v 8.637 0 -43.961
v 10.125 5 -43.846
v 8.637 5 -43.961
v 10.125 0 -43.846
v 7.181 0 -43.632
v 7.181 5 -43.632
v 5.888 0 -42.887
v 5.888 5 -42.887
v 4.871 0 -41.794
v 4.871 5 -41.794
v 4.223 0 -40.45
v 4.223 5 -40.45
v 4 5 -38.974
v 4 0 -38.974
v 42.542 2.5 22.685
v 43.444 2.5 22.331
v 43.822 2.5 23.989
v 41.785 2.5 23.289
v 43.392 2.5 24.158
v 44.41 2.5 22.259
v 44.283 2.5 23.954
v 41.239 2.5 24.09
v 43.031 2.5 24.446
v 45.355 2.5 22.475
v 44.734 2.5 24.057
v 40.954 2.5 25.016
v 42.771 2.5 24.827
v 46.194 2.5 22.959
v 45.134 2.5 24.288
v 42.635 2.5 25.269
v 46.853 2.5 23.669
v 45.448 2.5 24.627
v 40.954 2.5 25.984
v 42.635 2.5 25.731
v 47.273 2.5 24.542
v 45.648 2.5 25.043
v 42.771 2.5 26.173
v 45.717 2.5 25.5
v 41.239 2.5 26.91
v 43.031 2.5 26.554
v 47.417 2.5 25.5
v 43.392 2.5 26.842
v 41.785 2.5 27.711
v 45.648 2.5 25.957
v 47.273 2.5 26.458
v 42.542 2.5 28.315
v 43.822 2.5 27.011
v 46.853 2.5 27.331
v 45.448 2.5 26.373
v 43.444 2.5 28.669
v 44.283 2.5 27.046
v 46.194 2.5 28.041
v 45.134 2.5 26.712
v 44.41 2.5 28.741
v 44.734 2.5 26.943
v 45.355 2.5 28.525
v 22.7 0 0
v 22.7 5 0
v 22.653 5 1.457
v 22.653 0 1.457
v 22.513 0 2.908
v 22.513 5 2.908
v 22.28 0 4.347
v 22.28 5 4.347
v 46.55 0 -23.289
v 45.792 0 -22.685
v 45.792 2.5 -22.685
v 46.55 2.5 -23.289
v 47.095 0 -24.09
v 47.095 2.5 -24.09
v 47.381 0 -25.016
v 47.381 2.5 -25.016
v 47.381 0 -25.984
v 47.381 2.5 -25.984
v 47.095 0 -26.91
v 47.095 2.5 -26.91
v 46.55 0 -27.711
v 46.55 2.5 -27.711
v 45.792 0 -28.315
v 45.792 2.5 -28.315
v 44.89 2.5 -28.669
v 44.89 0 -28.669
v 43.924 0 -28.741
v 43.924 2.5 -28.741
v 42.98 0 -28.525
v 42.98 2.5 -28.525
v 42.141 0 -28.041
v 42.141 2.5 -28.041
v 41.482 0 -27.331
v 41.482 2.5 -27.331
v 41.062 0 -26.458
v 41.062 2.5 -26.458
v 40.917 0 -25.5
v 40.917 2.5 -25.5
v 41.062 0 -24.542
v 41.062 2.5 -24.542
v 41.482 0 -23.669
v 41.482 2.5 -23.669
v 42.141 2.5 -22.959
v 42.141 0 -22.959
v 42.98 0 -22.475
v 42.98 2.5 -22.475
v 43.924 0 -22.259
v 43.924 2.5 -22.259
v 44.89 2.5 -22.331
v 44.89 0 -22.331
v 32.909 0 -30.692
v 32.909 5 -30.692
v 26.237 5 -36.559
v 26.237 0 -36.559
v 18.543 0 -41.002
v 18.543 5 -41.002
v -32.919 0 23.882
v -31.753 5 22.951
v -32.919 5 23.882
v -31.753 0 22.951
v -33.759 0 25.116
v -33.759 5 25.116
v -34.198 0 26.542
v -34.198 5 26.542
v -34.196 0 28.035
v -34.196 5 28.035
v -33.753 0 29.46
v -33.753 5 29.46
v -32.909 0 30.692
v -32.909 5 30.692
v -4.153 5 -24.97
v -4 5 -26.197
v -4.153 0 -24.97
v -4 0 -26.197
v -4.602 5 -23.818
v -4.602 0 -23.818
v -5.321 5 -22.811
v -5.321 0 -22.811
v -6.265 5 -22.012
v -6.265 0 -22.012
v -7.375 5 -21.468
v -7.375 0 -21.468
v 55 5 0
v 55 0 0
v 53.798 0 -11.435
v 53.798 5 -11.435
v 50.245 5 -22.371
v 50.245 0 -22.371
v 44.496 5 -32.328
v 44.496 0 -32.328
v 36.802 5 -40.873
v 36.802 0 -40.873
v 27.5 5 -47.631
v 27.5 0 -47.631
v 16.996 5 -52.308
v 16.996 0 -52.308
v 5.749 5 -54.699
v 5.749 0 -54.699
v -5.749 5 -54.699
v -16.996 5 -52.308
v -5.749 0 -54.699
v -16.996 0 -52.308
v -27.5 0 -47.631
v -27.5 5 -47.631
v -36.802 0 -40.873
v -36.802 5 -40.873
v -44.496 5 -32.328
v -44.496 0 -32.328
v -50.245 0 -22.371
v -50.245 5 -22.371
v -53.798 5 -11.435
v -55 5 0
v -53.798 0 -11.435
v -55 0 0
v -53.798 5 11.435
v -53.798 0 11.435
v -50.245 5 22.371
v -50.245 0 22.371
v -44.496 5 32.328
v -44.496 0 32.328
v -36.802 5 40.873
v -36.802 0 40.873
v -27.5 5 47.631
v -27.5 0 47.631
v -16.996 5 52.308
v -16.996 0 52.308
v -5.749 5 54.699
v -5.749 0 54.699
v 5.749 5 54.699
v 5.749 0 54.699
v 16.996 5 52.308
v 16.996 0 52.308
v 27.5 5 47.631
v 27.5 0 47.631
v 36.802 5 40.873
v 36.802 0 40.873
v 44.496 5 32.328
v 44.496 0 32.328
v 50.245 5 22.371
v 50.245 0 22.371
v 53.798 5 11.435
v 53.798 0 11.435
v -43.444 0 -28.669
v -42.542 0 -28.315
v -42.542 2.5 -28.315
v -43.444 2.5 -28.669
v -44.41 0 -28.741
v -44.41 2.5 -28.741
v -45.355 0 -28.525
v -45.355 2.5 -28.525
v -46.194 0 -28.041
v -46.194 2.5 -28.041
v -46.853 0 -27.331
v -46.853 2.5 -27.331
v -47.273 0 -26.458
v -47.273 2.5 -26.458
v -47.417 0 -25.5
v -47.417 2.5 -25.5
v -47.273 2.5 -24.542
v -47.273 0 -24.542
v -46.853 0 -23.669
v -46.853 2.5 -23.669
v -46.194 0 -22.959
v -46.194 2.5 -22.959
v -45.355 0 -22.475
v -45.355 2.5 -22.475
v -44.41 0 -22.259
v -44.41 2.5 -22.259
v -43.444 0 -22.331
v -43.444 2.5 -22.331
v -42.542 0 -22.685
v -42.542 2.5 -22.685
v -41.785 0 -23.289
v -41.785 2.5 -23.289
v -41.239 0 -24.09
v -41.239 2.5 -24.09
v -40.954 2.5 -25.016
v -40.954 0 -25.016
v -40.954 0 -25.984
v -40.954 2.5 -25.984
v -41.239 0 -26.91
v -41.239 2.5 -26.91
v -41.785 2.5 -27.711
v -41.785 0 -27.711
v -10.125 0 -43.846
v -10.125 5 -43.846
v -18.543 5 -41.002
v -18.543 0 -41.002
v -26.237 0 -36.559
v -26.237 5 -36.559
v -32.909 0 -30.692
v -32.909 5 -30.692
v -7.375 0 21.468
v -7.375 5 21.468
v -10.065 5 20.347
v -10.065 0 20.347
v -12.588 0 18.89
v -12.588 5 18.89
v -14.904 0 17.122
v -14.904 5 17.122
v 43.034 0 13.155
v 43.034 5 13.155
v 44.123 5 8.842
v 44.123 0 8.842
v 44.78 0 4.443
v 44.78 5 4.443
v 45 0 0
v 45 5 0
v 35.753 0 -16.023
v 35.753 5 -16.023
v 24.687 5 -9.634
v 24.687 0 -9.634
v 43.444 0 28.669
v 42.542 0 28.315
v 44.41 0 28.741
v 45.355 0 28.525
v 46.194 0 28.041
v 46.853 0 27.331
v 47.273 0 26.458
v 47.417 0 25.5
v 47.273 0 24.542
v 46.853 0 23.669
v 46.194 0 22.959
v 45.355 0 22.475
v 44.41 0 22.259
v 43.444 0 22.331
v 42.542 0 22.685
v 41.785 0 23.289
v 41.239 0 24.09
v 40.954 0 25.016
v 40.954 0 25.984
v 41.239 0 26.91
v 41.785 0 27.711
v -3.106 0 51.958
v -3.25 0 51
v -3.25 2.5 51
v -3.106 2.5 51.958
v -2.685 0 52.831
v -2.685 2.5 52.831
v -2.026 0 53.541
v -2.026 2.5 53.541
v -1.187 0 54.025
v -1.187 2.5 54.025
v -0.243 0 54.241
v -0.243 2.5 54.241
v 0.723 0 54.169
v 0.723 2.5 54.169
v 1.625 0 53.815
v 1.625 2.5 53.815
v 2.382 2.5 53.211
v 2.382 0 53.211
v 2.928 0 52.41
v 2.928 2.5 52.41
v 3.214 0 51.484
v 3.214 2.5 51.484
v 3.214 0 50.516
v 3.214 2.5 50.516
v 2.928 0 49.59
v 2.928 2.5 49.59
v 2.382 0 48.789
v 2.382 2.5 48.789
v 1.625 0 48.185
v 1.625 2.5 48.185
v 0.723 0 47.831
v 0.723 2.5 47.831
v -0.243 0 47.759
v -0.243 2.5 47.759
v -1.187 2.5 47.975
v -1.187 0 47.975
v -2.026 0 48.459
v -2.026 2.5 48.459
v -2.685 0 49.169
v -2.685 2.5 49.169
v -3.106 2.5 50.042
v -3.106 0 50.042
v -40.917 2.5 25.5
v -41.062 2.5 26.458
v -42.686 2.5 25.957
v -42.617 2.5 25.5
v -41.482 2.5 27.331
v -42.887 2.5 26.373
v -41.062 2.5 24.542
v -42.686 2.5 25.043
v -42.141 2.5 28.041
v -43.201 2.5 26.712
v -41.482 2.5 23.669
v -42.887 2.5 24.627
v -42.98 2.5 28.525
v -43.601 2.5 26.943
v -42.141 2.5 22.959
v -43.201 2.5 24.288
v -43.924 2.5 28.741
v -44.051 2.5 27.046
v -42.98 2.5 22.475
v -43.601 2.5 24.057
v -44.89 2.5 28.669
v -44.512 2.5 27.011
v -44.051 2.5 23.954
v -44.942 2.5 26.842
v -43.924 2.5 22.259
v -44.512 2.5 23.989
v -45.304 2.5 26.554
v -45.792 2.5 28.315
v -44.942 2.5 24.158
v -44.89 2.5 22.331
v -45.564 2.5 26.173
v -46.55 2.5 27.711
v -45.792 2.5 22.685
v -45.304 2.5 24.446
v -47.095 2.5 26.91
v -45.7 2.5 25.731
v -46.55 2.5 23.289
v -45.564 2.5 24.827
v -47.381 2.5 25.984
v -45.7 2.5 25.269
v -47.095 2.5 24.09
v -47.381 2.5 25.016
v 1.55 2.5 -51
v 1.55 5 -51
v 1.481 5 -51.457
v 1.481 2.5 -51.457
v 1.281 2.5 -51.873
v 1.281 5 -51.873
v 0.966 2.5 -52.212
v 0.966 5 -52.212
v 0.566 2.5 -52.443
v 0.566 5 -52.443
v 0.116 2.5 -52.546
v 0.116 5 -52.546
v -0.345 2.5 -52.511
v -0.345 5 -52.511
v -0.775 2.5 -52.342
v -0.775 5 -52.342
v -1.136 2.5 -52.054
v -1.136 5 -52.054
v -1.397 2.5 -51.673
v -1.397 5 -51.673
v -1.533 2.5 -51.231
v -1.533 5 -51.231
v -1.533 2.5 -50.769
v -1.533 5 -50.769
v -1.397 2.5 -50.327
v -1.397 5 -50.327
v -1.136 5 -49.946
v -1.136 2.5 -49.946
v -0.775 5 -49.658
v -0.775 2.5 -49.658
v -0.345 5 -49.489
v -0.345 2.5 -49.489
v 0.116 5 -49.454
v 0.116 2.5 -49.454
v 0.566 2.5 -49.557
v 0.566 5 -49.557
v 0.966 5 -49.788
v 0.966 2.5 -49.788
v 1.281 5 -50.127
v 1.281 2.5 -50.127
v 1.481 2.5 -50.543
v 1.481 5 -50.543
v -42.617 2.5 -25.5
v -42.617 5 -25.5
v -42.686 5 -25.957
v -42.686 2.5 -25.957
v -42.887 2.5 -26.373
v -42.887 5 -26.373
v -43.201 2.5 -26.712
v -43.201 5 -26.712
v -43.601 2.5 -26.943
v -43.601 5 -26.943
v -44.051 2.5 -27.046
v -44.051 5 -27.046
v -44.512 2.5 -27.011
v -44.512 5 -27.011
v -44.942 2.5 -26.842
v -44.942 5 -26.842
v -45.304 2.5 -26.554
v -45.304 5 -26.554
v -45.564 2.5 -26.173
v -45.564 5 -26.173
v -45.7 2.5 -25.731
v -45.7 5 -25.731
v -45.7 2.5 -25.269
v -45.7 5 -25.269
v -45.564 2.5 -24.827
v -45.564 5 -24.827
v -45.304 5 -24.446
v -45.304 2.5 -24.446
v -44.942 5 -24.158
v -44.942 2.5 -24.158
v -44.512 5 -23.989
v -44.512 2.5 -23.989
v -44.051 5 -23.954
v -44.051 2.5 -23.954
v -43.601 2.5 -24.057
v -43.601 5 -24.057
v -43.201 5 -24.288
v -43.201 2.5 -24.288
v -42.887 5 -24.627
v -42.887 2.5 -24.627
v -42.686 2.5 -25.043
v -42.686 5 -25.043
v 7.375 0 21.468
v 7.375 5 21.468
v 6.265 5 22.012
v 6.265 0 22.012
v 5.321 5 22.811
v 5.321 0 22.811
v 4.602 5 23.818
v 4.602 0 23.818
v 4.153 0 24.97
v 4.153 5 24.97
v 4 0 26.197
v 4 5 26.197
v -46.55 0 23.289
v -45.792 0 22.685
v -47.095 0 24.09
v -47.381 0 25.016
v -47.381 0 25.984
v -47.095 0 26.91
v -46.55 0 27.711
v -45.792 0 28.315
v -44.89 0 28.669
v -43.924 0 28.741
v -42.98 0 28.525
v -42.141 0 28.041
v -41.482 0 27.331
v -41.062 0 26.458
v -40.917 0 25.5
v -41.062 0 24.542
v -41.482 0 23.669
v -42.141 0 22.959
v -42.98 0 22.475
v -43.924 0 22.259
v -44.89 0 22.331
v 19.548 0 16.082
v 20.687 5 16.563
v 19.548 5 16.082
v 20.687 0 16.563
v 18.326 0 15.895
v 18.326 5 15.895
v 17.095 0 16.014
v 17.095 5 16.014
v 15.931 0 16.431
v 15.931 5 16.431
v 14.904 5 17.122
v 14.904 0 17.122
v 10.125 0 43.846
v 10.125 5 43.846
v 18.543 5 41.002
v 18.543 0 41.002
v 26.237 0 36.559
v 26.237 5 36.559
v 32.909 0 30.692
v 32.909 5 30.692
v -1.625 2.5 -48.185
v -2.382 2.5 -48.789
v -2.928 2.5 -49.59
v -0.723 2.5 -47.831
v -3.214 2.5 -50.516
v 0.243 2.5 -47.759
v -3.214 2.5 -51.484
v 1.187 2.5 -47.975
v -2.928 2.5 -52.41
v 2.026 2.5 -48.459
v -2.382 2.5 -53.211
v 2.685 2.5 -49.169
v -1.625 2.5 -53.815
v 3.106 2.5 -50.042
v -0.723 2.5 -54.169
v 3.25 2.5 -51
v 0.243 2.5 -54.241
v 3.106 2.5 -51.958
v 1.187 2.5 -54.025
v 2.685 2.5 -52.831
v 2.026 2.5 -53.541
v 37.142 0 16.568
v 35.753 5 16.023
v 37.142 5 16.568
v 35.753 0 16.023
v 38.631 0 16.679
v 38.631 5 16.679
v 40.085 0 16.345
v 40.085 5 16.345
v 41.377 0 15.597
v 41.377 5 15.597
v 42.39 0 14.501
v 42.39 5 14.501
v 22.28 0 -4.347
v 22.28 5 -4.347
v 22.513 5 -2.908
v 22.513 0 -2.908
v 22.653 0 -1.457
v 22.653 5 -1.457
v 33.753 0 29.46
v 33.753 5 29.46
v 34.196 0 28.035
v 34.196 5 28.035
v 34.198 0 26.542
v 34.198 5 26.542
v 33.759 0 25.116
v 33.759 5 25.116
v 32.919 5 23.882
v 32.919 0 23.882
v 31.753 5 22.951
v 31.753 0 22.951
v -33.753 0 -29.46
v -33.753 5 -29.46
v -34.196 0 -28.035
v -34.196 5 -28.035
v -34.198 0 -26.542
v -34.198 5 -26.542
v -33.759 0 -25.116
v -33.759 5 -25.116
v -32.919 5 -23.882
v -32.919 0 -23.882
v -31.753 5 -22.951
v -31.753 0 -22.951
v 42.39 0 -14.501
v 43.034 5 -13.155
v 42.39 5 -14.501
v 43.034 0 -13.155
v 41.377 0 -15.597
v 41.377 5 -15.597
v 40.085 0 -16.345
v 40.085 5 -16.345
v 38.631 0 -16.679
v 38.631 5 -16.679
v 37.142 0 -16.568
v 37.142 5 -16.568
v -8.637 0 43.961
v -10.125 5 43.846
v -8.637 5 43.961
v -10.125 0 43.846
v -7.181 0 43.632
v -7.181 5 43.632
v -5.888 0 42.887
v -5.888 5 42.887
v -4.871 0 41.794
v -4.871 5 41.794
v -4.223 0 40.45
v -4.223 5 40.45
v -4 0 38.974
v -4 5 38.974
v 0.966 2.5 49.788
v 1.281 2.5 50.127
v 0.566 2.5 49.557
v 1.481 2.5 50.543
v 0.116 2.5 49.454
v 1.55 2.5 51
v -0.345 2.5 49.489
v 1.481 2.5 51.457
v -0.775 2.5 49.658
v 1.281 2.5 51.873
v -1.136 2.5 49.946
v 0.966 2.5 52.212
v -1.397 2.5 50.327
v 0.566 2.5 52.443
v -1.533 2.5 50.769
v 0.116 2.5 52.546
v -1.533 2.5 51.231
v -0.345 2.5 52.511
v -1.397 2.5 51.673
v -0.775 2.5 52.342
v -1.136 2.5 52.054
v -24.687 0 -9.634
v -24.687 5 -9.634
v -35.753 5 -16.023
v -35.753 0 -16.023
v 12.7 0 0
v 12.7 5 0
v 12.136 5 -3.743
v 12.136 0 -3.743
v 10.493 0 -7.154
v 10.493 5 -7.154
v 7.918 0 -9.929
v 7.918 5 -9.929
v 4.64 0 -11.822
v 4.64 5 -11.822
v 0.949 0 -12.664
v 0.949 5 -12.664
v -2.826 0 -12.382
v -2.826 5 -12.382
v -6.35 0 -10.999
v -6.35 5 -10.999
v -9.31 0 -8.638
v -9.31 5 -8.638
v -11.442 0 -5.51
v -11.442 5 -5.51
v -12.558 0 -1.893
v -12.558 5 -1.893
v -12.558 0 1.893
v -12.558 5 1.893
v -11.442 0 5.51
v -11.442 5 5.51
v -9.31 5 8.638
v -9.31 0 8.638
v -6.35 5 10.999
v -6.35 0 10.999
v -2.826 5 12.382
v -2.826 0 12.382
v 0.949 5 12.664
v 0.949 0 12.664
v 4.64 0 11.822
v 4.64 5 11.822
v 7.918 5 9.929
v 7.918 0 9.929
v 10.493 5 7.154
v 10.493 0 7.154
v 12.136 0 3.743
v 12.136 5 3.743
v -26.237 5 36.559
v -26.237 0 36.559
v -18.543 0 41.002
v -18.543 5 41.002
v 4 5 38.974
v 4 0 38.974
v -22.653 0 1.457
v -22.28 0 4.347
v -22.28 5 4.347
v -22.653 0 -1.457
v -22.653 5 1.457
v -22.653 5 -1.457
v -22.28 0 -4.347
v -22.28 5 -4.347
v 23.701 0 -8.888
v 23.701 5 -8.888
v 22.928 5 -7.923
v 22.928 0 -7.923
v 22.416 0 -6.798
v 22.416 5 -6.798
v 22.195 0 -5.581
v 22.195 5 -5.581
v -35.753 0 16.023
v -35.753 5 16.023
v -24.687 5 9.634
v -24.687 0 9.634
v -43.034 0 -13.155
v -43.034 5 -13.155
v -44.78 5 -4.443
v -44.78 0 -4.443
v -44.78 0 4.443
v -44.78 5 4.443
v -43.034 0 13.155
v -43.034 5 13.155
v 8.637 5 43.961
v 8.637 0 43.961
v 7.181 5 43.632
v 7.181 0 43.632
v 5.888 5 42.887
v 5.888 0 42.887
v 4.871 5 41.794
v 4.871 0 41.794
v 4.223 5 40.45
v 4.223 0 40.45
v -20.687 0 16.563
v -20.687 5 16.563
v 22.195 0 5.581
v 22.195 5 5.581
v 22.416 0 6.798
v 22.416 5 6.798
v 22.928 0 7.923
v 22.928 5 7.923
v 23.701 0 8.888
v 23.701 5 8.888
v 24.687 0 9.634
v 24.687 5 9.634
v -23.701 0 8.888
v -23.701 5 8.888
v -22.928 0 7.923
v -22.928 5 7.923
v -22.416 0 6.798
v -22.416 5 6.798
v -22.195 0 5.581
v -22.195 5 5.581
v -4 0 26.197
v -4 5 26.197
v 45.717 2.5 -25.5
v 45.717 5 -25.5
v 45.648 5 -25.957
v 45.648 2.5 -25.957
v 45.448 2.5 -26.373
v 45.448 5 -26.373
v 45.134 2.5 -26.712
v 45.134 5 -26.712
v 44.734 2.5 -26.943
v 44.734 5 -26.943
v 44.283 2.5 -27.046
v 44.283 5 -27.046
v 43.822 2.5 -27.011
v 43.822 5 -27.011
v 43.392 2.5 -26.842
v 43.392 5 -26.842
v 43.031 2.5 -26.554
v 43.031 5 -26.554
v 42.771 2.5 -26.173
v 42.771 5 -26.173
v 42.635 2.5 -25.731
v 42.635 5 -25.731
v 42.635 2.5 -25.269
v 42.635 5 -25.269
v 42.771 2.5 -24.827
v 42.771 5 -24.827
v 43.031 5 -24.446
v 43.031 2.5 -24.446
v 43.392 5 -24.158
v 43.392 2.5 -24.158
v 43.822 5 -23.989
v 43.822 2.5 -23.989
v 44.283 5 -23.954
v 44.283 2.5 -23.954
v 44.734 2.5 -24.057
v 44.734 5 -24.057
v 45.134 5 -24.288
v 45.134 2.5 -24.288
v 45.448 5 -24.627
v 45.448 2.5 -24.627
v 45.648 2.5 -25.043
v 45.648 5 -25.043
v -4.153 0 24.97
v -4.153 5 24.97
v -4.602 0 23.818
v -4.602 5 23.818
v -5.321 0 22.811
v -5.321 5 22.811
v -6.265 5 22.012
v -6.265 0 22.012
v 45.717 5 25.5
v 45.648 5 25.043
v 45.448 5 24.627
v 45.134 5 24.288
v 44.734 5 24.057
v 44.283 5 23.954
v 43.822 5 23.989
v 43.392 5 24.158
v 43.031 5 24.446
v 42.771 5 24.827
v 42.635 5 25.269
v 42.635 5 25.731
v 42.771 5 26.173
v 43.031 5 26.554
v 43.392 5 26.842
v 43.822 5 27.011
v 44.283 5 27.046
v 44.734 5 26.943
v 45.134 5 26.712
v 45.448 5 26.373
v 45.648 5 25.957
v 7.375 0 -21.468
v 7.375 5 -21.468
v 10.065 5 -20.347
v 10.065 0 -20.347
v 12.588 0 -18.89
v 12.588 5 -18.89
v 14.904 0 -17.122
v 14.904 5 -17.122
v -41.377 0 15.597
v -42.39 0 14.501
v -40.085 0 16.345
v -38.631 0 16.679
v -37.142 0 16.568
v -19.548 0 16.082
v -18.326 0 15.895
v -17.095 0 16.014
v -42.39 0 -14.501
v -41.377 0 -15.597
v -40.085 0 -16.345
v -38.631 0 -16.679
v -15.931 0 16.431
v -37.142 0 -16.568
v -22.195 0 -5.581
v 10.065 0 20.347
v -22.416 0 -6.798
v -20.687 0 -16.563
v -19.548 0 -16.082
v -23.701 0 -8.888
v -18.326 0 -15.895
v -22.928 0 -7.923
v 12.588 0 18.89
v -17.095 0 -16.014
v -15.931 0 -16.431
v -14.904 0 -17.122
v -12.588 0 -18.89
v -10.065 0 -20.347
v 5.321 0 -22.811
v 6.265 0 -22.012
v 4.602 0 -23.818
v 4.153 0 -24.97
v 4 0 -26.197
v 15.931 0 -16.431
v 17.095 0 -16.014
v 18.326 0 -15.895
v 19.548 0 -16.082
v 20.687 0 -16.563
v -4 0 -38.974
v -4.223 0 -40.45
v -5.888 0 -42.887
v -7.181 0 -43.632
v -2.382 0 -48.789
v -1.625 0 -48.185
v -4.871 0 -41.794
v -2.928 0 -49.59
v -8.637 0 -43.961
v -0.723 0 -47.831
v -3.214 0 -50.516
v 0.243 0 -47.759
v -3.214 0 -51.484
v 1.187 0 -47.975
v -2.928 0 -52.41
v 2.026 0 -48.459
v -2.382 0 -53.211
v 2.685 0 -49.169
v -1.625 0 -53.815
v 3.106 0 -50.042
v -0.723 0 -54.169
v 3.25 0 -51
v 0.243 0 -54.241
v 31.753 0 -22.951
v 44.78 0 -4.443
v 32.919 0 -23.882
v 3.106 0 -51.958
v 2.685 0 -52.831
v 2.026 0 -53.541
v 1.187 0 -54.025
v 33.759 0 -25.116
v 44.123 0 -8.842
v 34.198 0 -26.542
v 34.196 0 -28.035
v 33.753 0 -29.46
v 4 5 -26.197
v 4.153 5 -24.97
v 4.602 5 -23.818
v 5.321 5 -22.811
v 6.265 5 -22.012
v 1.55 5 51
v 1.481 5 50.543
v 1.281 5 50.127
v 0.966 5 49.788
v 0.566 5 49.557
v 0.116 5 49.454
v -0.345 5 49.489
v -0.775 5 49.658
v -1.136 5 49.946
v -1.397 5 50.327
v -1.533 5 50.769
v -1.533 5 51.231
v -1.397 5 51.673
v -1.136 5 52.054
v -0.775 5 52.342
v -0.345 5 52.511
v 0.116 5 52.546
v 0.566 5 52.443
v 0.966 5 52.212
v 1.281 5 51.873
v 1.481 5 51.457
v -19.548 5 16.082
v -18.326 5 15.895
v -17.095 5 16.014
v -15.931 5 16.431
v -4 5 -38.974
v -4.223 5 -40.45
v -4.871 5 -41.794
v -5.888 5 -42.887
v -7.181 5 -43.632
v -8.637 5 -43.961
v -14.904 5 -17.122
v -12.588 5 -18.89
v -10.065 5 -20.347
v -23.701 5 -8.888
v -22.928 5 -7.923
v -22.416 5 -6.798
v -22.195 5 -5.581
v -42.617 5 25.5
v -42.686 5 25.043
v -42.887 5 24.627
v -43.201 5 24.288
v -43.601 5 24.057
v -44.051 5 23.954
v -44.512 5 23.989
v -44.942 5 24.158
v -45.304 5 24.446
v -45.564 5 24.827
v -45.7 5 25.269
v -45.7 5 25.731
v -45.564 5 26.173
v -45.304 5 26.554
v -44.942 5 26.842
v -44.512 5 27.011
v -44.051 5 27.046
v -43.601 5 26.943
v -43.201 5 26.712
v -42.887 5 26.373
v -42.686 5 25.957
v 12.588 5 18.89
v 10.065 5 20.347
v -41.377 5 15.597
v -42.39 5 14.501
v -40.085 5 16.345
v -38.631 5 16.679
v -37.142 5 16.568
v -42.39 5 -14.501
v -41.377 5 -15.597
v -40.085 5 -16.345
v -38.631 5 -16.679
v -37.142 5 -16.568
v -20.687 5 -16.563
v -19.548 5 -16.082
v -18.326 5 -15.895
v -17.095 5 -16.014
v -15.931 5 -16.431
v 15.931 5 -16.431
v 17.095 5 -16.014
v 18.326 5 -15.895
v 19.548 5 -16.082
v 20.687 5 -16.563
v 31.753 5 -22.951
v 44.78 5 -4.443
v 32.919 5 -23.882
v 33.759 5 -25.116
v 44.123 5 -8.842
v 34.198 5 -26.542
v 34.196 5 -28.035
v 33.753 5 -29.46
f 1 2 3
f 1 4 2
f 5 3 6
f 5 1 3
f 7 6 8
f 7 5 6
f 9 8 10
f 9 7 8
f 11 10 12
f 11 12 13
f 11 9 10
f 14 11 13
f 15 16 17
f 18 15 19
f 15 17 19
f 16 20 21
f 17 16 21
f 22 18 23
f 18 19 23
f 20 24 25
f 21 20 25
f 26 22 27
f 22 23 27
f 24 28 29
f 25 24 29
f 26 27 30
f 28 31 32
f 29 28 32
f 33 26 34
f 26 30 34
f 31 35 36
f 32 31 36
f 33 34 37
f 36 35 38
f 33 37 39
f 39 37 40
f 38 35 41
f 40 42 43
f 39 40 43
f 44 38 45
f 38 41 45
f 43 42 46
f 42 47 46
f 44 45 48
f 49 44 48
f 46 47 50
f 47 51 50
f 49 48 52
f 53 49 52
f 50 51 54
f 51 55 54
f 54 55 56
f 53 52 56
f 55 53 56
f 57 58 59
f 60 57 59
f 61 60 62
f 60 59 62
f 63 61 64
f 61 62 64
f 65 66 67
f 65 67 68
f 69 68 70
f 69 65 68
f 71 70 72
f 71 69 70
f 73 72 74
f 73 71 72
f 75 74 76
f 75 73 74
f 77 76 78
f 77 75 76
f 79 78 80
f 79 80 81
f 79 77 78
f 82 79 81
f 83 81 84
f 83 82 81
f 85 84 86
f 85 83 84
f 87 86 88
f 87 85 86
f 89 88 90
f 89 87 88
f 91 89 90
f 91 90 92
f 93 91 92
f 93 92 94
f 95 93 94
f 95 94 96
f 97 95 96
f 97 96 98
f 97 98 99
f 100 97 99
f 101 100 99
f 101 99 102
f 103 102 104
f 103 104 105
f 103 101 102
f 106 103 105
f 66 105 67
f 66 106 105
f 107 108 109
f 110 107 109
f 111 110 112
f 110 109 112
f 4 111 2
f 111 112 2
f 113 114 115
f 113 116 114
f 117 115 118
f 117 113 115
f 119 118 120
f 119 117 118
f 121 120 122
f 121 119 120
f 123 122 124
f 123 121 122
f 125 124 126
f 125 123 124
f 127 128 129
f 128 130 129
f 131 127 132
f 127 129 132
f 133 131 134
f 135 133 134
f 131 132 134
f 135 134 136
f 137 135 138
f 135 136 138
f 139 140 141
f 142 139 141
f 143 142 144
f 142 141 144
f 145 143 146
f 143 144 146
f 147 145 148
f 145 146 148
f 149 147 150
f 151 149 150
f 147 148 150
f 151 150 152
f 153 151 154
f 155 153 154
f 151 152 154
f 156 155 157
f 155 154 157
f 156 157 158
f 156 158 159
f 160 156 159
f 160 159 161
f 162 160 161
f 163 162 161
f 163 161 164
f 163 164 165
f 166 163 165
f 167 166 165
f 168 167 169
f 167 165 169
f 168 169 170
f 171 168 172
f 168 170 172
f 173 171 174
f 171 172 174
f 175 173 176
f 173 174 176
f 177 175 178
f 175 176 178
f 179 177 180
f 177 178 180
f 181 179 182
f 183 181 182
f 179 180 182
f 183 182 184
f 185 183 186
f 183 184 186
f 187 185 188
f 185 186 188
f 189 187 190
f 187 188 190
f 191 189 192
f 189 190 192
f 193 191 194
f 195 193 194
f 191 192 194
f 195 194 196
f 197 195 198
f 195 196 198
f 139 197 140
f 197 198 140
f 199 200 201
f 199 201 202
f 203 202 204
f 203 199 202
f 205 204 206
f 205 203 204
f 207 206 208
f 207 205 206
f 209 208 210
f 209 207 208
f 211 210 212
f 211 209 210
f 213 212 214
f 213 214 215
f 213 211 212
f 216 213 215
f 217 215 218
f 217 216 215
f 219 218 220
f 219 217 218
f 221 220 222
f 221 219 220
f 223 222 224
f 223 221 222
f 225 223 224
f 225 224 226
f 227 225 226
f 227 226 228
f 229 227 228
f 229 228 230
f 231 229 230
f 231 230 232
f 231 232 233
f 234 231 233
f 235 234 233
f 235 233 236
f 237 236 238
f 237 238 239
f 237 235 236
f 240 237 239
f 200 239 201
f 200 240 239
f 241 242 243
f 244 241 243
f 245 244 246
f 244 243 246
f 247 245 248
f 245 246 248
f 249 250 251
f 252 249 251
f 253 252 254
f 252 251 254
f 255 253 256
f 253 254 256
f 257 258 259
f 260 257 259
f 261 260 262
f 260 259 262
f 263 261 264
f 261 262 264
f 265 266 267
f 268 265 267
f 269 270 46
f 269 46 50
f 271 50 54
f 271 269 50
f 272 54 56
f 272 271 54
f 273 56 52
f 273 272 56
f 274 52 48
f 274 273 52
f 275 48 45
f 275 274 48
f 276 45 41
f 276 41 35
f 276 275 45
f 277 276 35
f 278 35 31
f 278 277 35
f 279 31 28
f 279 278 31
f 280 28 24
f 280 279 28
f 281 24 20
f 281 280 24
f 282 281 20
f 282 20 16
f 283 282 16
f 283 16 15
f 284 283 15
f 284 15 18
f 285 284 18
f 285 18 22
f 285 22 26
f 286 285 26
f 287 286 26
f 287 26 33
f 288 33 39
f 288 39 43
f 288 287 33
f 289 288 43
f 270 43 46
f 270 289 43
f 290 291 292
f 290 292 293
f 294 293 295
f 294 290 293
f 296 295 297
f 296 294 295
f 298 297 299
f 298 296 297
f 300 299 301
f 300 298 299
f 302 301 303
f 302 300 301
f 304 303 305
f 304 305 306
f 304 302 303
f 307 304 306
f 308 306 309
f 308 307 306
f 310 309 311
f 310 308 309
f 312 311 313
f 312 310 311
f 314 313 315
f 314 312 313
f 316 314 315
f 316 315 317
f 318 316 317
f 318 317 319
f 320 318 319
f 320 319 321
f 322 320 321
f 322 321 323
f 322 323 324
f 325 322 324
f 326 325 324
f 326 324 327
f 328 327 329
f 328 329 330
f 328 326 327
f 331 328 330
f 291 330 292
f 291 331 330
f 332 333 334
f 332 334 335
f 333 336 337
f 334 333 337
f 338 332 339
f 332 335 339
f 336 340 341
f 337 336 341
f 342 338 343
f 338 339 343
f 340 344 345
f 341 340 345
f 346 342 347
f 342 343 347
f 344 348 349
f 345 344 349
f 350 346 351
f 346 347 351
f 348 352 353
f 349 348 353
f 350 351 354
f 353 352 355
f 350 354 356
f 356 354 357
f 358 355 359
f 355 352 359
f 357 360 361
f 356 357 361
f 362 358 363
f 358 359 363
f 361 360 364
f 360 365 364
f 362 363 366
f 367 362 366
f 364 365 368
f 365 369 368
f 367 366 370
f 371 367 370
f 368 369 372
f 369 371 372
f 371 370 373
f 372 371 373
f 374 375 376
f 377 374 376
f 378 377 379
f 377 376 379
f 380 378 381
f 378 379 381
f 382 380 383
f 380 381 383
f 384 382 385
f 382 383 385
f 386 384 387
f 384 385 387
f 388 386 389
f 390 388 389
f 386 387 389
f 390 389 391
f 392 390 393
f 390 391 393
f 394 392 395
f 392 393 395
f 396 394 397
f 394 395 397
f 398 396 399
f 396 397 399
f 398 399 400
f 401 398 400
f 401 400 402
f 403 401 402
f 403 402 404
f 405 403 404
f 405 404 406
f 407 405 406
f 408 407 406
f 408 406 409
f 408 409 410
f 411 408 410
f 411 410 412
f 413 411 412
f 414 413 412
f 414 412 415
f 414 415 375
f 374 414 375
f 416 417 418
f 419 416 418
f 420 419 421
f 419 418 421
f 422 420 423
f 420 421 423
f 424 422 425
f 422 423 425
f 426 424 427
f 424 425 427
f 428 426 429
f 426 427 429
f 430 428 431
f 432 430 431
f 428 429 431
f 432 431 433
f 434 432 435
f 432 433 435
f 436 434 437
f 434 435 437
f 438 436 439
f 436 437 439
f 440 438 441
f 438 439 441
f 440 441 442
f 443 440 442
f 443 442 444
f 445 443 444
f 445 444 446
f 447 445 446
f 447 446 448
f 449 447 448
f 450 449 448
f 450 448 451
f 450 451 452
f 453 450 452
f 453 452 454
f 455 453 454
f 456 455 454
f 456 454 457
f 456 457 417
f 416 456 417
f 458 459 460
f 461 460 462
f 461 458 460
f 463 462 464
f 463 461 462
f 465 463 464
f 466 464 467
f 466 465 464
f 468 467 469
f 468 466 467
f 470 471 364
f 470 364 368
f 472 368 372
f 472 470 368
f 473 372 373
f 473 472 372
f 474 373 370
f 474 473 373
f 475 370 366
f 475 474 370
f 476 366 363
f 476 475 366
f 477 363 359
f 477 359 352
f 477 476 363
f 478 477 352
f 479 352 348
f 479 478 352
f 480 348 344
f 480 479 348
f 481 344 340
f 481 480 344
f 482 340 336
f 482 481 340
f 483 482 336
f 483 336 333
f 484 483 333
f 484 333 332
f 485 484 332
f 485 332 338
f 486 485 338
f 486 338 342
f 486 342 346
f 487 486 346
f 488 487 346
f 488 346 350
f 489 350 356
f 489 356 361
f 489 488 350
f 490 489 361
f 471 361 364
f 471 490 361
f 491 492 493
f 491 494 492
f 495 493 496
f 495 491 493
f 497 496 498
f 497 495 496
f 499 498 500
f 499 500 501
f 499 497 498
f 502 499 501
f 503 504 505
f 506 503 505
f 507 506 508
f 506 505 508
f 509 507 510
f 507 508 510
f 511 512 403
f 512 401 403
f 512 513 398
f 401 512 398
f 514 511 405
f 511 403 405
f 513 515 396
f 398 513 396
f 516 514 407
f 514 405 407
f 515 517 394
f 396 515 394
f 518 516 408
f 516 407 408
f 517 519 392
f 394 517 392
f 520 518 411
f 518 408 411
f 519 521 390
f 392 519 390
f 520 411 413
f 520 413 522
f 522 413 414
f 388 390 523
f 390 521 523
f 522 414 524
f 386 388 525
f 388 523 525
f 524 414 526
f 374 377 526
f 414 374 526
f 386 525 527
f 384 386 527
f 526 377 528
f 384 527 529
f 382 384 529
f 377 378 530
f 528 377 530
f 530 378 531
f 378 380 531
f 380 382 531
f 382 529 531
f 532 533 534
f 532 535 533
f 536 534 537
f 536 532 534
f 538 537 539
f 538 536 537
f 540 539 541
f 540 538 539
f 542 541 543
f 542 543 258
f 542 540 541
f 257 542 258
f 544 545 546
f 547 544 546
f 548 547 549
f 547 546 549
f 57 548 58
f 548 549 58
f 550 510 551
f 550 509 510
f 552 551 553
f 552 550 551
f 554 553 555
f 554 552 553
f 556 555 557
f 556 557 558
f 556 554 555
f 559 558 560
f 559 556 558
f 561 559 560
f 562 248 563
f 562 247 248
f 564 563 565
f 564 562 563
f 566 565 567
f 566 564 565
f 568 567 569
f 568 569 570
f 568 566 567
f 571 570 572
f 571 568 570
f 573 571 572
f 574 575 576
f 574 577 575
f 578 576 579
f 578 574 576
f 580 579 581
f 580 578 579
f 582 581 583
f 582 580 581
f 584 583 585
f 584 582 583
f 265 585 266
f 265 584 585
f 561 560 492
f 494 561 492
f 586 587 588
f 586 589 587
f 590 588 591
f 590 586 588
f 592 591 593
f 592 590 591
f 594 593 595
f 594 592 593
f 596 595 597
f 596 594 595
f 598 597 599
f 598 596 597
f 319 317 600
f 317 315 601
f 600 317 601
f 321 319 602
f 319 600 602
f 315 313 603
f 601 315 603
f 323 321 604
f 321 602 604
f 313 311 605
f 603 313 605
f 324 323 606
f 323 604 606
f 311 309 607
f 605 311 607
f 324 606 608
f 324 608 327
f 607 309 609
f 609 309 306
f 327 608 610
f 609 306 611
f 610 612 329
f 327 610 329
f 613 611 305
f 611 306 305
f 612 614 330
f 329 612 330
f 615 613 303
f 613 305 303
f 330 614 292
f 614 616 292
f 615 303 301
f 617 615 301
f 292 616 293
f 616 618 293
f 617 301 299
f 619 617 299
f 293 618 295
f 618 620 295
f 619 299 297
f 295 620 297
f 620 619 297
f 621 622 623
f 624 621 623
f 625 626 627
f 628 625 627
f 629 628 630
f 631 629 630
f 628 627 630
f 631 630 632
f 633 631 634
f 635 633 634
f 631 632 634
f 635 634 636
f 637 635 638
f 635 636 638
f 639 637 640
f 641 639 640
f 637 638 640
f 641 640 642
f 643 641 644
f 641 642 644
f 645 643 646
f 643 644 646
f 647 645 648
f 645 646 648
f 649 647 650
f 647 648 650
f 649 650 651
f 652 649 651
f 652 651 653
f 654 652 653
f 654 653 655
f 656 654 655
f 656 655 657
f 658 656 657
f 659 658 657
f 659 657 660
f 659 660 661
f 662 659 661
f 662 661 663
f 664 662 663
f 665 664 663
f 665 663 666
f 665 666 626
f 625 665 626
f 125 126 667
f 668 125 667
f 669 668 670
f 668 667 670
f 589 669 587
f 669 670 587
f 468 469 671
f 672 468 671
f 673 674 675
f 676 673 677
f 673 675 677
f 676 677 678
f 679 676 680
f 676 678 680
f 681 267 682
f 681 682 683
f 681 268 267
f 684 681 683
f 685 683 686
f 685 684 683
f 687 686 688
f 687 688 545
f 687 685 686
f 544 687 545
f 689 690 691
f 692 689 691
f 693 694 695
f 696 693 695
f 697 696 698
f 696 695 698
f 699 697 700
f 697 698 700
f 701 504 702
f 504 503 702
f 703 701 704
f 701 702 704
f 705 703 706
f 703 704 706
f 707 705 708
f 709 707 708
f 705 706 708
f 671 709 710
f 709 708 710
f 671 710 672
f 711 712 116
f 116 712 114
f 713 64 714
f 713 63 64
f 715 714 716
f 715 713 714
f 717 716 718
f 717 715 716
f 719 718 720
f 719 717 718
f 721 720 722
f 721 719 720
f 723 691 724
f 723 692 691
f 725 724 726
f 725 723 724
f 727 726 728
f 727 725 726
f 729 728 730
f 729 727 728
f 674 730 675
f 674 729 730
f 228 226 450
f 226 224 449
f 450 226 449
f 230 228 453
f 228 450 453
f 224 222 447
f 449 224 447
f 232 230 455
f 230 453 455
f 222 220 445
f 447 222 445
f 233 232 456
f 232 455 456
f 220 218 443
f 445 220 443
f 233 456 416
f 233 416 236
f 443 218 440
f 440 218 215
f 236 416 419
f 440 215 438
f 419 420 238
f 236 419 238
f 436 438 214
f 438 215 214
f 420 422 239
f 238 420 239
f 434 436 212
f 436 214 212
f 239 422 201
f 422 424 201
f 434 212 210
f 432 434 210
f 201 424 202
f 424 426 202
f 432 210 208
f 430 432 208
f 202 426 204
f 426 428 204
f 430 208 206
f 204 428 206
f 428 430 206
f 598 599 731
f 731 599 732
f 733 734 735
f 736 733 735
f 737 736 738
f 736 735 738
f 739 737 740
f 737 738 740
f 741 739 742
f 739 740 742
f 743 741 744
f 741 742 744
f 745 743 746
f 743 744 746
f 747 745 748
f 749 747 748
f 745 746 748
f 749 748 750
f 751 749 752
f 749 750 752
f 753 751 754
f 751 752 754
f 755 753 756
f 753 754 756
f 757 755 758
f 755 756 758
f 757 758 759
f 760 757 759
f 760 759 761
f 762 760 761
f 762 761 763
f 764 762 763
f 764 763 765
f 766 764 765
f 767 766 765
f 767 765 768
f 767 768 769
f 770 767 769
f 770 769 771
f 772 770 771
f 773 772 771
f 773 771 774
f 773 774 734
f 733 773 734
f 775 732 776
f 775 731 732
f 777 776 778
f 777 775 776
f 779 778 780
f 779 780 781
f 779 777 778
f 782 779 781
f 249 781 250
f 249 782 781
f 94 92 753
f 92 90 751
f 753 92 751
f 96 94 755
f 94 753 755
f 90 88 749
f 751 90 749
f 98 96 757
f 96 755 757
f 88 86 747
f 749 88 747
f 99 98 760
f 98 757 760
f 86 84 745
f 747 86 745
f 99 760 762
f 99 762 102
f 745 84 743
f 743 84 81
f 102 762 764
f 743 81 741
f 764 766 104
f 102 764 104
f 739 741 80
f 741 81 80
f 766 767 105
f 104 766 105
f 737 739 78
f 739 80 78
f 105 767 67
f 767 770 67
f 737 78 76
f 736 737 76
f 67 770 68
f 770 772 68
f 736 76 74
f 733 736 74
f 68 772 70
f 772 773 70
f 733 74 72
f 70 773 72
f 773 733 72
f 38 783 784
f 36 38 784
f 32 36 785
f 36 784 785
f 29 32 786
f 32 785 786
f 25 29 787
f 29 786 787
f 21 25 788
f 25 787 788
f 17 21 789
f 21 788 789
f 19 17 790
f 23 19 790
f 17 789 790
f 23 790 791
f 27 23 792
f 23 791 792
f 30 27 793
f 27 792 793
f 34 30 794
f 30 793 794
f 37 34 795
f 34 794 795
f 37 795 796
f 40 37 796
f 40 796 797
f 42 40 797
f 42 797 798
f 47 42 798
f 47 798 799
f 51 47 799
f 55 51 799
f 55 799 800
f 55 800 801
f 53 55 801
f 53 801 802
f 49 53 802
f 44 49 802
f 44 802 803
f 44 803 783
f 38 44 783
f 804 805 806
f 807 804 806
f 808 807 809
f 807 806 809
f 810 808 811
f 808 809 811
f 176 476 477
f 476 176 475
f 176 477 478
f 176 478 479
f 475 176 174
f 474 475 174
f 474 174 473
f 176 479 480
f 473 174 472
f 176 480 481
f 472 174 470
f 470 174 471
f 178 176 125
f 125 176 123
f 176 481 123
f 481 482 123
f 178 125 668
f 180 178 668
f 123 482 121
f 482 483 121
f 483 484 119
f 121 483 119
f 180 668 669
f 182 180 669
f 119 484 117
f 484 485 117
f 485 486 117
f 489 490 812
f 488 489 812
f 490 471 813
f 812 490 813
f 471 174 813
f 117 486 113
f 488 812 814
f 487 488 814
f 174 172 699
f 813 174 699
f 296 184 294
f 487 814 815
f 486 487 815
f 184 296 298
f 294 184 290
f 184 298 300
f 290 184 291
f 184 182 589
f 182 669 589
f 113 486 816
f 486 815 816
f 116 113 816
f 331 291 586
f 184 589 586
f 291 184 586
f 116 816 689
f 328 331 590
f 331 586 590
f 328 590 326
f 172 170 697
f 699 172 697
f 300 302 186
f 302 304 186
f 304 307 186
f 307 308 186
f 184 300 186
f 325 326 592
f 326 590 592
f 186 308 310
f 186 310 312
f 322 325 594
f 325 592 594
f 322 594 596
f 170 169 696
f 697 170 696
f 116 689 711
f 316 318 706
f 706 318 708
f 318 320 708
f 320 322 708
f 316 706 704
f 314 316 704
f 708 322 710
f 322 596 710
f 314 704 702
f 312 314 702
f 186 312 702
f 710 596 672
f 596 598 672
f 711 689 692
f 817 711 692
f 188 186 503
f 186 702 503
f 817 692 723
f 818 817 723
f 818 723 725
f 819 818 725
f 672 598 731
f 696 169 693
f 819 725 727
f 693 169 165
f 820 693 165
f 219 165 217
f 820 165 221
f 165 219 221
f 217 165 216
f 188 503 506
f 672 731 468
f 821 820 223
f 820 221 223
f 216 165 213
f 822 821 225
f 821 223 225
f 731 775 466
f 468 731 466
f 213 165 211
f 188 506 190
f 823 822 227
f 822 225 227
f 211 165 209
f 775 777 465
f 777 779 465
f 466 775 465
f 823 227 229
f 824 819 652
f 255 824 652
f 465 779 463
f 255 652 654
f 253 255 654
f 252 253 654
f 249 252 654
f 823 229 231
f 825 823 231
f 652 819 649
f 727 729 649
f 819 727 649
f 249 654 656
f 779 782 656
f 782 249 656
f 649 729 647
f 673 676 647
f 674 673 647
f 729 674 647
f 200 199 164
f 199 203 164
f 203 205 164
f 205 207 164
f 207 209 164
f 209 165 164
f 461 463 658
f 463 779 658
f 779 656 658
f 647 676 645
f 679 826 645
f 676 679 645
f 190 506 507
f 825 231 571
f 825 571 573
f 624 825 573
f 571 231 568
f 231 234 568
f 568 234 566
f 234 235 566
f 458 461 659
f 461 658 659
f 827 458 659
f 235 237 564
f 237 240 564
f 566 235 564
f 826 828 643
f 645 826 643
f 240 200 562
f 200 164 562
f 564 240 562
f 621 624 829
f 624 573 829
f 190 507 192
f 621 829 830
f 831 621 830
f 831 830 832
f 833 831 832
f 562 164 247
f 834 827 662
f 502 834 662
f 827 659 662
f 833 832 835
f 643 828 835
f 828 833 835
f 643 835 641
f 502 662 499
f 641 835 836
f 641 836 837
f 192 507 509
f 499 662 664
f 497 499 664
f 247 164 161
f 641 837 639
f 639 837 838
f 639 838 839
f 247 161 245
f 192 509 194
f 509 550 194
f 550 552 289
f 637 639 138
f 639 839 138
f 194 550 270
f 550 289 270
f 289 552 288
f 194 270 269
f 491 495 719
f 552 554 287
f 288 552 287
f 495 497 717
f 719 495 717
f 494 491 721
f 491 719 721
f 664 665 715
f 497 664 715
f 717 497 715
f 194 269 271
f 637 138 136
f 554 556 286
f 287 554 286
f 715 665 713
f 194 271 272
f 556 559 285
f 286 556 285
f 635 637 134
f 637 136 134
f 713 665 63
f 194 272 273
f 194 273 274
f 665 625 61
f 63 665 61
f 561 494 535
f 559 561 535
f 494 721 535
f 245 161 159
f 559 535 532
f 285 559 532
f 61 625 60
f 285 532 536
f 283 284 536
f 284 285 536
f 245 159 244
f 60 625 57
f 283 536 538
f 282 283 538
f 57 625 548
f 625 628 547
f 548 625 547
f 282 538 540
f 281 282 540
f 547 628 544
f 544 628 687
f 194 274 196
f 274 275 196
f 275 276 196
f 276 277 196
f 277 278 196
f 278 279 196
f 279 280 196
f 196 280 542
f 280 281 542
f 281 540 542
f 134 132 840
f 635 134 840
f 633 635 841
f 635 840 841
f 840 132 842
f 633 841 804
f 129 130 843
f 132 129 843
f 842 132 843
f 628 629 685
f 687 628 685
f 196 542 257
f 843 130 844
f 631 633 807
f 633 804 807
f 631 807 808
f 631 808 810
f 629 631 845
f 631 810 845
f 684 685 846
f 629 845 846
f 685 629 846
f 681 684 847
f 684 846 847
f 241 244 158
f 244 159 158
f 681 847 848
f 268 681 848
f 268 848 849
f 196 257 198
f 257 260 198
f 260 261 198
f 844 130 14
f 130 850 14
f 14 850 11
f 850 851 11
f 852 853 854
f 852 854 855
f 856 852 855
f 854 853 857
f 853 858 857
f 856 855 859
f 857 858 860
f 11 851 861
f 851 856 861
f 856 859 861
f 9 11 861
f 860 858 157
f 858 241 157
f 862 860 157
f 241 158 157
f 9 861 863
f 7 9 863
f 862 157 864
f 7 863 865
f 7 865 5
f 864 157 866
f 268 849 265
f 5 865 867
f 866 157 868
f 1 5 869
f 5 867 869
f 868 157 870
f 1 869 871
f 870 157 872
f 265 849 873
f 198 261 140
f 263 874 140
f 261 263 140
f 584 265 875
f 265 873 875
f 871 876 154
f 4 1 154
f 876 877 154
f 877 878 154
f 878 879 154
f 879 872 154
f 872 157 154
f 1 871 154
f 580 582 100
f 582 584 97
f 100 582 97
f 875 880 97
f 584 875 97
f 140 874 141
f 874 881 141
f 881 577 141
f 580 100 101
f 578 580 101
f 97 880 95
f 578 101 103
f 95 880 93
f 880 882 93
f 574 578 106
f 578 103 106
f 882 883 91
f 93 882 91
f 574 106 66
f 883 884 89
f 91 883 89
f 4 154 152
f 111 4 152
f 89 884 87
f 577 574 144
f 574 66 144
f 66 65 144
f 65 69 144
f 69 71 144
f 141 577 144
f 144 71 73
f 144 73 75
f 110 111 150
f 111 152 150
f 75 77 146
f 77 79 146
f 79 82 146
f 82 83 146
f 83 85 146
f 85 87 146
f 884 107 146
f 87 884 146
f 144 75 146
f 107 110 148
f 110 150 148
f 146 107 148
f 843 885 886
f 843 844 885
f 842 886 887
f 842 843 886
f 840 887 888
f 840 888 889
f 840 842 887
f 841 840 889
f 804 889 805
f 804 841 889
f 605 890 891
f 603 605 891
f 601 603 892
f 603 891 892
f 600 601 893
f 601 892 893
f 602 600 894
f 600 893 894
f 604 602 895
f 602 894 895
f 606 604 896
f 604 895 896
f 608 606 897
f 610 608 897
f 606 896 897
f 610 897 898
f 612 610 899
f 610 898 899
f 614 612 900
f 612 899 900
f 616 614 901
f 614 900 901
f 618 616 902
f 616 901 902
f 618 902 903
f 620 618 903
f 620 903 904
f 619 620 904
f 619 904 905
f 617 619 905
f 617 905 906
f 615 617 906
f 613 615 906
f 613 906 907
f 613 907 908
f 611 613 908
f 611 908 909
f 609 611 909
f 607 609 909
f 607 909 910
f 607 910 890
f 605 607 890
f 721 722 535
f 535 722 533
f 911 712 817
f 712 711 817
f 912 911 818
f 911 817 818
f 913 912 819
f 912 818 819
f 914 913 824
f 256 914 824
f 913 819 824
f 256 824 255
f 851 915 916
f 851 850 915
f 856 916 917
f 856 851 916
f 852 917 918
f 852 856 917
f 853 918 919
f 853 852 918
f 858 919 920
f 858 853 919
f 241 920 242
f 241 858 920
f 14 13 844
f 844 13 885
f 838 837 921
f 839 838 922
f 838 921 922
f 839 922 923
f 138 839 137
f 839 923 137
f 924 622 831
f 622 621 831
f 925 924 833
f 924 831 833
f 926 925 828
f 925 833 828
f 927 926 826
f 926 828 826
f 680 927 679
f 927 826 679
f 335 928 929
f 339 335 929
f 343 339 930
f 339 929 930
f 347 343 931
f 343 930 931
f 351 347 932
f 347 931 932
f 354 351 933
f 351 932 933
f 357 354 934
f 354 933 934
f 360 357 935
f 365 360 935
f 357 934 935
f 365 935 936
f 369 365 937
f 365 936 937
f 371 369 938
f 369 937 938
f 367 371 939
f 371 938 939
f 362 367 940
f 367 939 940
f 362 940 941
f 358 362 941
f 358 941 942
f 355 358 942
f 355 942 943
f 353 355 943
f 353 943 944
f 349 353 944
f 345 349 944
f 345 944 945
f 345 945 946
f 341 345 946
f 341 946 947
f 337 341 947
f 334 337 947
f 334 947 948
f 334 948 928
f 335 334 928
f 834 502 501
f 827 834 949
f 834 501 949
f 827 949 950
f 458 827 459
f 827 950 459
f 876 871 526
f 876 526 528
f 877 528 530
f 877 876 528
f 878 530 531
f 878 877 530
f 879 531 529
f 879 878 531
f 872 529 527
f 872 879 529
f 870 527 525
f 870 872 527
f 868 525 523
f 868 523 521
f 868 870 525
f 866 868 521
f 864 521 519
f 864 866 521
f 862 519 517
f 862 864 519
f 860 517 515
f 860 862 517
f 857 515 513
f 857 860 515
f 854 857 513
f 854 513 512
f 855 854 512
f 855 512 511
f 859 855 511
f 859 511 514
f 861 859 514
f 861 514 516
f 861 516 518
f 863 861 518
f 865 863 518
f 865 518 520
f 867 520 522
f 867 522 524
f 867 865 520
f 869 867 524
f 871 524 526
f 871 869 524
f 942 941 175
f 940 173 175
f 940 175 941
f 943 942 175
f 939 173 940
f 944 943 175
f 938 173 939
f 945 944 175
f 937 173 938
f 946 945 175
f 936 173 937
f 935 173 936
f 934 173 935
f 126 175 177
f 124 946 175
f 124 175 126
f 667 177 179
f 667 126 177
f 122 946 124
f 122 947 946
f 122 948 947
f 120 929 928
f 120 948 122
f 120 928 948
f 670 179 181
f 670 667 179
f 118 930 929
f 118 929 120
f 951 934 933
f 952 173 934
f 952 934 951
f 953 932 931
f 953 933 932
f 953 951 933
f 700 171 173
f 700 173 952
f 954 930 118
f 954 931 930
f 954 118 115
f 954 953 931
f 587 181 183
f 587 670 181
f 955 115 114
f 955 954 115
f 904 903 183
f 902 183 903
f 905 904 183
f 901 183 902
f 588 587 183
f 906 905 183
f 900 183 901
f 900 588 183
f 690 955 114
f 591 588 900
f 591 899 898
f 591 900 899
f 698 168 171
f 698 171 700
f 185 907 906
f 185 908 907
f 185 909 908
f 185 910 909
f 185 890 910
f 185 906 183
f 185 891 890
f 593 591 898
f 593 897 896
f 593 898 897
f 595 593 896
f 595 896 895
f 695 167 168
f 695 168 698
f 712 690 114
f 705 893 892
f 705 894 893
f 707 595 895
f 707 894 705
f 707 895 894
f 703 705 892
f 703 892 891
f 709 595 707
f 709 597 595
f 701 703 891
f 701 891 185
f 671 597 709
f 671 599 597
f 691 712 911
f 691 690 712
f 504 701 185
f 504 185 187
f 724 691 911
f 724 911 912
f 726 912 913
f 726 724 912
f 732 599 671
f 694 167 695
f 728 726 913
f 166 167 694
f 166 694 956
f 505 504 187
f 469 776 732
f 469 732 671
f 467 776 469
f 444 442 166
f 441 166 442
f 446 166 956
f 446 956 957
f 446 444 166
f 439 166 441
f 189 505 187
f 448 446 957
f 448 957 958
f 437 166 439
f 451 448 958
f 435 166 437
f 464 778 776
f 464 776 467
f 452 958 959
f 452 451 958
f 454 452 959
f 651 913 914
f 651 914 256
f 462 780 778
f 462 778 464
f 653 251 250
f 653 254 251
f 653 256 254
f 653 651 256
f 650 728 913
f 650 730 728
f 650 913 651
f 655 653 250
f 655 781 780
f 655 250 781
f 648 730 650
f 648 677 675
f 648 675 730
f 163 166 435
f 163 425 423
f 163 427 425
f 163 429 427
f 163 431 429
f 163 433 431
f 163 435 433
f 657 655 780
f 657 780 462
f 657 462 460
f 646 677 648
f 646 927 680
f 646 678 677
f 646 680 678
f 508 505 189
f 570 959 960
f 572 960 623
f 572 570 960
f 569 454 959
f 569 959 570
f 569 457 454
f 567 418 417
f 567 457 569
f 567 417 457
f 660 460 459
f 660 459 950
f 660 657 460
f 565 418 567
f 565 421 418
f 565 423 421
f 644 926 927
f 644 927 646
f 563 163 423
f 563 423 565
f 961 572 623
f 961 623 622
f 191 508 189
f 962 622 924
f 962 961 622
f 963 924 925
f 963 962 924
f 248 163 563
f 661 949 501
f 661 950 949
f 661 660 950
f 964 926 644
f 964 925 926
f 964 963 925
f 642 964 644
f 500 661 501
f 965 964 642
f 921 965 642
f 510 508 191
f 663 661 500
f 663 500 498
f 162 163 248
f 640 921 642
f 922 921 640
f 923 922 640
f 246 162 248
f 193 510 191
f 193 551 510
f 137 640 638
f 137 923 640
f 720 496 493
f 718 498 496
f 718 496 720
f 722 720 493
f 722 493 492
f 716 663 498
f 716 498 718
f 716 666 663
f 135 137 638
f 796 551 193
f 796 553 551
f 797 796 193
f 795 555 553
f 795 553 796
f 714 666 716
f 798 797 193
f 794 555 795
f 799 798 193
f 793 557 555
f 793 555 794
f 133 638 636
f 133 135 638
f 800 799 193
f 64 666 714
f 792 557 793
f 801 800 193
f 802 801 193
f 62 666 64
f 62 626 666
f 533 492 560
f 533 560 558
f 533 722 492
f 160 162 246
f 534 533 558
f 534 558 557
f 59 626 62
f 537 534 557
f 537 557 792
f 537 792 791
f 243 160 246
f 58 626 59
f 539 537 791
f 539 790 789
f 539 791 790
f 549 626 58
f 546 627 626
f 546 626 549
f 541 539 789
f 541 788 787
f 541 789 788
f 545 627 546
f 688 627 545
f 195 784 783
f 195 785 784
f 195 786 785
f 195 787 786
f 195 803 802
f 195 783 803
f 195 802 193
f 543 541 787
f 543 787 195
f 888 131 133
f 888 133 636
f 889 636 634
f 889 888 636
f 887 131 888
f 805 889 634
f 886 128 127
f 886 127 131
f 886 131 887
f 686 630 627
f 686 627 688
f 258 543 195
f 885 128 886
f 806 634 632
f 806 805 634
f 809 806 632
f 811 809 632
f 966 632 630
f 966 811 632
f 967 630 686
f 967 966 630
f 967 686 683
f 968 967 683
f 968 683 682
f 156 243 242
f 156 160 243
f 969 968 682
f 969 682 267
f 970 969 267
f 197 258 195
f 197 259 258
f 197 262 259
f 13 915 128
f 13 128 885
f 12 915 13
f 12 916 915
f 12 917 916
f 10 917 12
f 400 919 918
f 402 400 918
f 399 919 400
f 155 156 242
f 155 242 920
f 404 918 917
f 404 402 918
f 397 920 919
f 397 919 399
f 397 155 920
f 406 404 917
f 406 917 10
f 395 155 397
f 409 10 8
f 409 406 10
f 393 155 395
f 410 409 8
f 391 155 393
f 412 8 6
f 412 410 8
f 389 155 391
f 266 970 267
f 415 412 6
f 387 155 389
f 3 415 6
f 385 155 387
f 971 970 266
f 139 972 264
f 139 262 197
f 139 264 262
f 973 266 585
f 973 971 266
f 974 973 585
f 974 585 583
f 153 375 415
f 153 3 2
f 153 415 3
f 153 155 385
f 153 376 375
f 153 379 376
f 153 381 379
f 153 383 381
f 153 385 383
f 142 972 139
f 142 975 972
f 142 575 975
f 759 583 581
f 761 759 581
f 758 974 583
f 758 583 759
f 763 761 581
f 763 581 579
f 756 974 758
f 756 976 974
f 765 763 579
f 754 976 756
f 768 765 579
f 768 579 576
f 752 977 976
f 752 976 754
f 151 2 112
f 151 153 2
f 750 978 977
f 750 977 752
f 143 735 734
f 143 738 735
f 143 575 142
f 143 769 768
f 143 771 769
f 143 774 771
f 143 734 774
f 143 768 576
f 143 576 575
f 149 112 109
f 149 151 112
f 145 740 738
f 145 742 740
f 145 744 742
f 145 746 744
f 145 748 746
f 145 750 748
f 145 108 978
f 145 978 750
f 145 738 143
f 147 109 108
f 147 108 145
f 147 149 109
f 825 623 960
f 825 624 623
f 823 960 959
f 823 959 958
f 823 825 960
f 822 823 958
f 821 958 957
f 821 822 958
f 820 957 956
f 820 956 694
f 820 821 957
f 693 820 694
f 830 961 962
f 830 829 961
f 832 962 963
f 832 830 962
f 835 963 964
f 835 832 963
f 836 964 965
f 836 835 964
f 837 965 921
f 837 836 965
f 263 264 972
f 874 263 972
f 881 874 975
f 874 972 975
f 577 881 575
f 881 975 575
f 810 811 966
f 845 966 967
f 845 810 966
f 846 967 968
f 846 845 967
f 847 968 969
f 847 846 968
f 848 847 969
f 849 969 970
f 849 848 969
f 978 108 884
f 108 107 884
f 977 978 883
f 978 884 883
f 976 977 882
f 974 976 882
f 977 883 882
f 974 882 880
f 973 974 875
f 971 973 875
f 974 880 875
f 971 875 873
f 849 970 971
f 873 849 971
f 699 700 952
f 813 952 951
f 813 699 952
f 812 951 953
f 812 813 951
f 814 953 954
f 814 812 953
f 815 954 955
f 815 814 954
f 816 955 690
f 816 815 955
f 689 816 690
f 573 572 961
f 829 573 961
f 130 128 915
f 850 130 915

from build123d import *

# Parameters (mm, degrees)
SKETCH1_R           = 55
BOSS_EXTRUDE1_DEPTH = 5
SKETCH2_R           = 1.55
CUT_EXTRUDE1_DEPTH  = 6
SKETCH5_R           = 12.7
CUT_EXTRUDE4_DEPTH  = 6
CUT_EXTRUDE5_DEPTH  = 6
FILLET1_R           = 5
FILLET2_R           = 5
SKETCH8_R           = 3.25
CUT_EXTRUDE6_DEPTH  = 2.5
CIRPATTERN3_COUNT   = 6


with BuildPart() as part:
    # Sketch1 → Boss-Extrude1 (new body)
    with BuildSketch(Plane(origin=(0, 0, 0), x_dir=(1, 0, 0), z_dir=(0, 1, 0))):
        Circle(SKETCH1_R)
    extrude(amount=BOSS_EXTRUDE1_DEPTH)

    # Sketch2 → Cut-Extrude1 (cut, through all)
    with BuildSketch(Plane(origin=(0, 5, 0), x_dir=(1, 0, 0), z_dir=(0, 1, 0))):
        with Locations((0, 51)):
            Circle(SKETCH2_R)
        with Locations((44.167295593, 25.5)):
            Circle(SKETCH2_R)
        with Locations((44.167295593, -25.5)):
            Circle(SKETCH2_R)
        with Locations((0, -51)):
            Circle(SKETCH2_R)
        with Locations((-44.167295593, -25.5)):
            Circle(SKETCH2_R)
        with Locations((-44.167295593, 25.5)):
            Circle(SKETCH2_R)
    extrude(amount=-CUT_EXTRUDE1_DEPTH, mode=Mode.SUBTRACT)

    # Sketch5 → Cut-Extrude4 (cut, through all)
    with BuildSketch(Plane(origin=(0, 5, 0), x_dir=(1, 0, 0), z_dir=(0, 1, 0))):
        Circle(SKETCH5_R)
    extrude(amount=-CUT_EXTRUDE4_DEPTH, mode=Mode.SUBTRACT)

    # Sketch7 → Cut-Extrude5 (cut, through all)
    with BuildSketch(Plane(origin=(0, 5, 0), x_dir=(1, 0, 0), z_dir=(0, 1, 0))):
        with BuildLine():
            Line((-21.351162756, 7.708297411), (-40.816877772, 18.946833216))
            ThreePointArc((-40.816877772, 18.946833216), (-45, 0), (-40.816877772, -18.946833216))
            Line((-40.816877772, -18.946833216), (-21.351162756, -7.708297411))
            ThreePointArc((-21.351162756, -7.708297411), (-22.7, 0), (-21.351162756, 7.708297411))
        make_face()
        with BuildLine():
            Line((-17.351162756, -14.636500641), (-36.816877772, -25.875036446))
            ThreePointArc((-36.816877772, -25.875036446), (-22.5, -38.97114317), (-4, -44.821869662))
            Line((-4, -44.821869662), (-4, -22.344798052))
            ThreePointArc((-4, -22.344798052), (-11.35, -19.658776666), (-17.351162756, -14.636500641))
        make_face()
        with BuildLine():
            ThreePointArc((4, -44.821869662), (22.5, -38.97114317), (36.816877772, -25.875036446))
            Line((36.816877772, -25.875036446), (17.351162756, -14.636500641))
            ThreePointArc((17.351162756, -14.636500641), (11.35, -19.658776666), (4, -22.344798052))
            Line((4, -22.344798052), (4, -44.821869662))
        make_face()
        with BuildLine():
            ThreePointArc((45, 0), (43.941776818, 9.701559159), (40.816877772, 18.946833216))
            Line((40.816877772, 18.946833216), (21.351162756, 7.708297411))
            ThreePointArc((21.351162756, 7.708297411), (22.360248149, 3.912710406), (22.7, 0))
            ThreePointArc((22.7, 0), (22.360248149, -3.912710406), (21.351162756, -7.708297411))
            Line((21.351162756, -7.708297411), (40.816877772, -18.946833216))
            ThreePointArc((40.816877772, -18.946833216), (43.941776818, -9.701559159), (45, 0))
        make_face()
        with BuildLine():
            ThreePointArc((36.816877772, 25.875036446), (22.5, 38.97114317), (4, 44.821869662))
            Line((4, 44.821869662), (4, 22.344798052))
            ThreePointArc((4, 22.344798052), (11.35, 19.658776666), (17.351162756, 14.636500641))
            Line((17.351162756, 14.636500641), (36.816877772, 25.875036446))
        make_face()
        with BuildLine():
            Line((-4, 22.344798052), (-4, 44.821869662))
            ThreePointArc((-4, 44.821869662), (-22.5, 38.97114317), (-36.816877772, 25.875036446))
            Line((-36.816877772, 25.875036446), (-17.351162756, 14.636500641))
            ThreePointArc((-17.351162756, 14.636500641), (-11.35, 19.658776666), (-4, 22.344798052))
        make_face()
    extrude(amount=-CUT_EXTRUDE5_DEPTH, mode=Mode.SUBTRACT)

    # Fillet1
    fillet1_edges = [part.edges().sort_by_distance(p)[0] for p in [
        (-40.816877772, 2.5, -18.946833216),
        (-21.351162756, 2.5, -7.708297411),
        (-21.351162756, 2.5, 7.708297411),
        (-40.816877772, 2.5, 18.946833216),
    ]]
    fillet(fillet1_edges, radius=FILLET1_R)

    # Fillet2
    fillet2_edges = [part.edges().sort_by_distance(p)[0] for p in [
        (40.816877772, 2.5, 18.946833216),
        (21.351162756, 2.5, 7.708297411),
        (21.351162756, 2.5, -7.708297411),
        (40.816877772, 2.5, -18.946833216),
        (36.816877772, 2.5, -25.875036446),
        (17.351162756, 2.5, -14.636500641),
        (4, 2.5, -22.344798052),
        (4, 2.5, -44.821869662),
        (4, 2.5, 44.821869662),
        (4, 2.5, 22.344798052),
        (17.351162756, 2.5, 14.636500641),
        (36.816877772, 2.5, 25.875036446),
        (-36.816877772, 2.5, 25.875036446),
        (-17.351162756, 2.5, 14.636500641),
        (-4, 2.5, 22.344798052),
        (-4, 2.5, 44.821869662),
        (-4, 2.5, -44.821869662),
        (-4, 2.5, -22.344798052),
        (-17.351162756, 2.5, -14.636500641),
        (-36.816877772, 2.5, -25.875036446),
    ]]
    fillet(fillet2_edges, radius=FILLET2_R)

    # Sketch8 → Cut-Extrude6 (cut)
    with BuildSketch(Plane(origin=(0, 0, 0), x_dir=(1, 0, 0), z_dir=(0, 1, 0))):
        with Locations((0, 51)):
            Circle(SKETCH8_R)
    cut_extrude6 = extrude(amount=CUT_EXTRUDE6_DEPTH, mode=Mode.SUBTRACT)

    # CirPattern3: Cut-Extrude6 ×6 about axis
    cirpattern3_axis = Axis((0, 0, 0), (0, 1, 0))
    for i in range(1, CIRPATTERN3_COUNT):
        add(cut_extrude6.rotate(cirpattern3_axis, i * 360 / CIRPATTERN3_COUNT), mode=Mode.SUBTRACT)


solid = part.part
